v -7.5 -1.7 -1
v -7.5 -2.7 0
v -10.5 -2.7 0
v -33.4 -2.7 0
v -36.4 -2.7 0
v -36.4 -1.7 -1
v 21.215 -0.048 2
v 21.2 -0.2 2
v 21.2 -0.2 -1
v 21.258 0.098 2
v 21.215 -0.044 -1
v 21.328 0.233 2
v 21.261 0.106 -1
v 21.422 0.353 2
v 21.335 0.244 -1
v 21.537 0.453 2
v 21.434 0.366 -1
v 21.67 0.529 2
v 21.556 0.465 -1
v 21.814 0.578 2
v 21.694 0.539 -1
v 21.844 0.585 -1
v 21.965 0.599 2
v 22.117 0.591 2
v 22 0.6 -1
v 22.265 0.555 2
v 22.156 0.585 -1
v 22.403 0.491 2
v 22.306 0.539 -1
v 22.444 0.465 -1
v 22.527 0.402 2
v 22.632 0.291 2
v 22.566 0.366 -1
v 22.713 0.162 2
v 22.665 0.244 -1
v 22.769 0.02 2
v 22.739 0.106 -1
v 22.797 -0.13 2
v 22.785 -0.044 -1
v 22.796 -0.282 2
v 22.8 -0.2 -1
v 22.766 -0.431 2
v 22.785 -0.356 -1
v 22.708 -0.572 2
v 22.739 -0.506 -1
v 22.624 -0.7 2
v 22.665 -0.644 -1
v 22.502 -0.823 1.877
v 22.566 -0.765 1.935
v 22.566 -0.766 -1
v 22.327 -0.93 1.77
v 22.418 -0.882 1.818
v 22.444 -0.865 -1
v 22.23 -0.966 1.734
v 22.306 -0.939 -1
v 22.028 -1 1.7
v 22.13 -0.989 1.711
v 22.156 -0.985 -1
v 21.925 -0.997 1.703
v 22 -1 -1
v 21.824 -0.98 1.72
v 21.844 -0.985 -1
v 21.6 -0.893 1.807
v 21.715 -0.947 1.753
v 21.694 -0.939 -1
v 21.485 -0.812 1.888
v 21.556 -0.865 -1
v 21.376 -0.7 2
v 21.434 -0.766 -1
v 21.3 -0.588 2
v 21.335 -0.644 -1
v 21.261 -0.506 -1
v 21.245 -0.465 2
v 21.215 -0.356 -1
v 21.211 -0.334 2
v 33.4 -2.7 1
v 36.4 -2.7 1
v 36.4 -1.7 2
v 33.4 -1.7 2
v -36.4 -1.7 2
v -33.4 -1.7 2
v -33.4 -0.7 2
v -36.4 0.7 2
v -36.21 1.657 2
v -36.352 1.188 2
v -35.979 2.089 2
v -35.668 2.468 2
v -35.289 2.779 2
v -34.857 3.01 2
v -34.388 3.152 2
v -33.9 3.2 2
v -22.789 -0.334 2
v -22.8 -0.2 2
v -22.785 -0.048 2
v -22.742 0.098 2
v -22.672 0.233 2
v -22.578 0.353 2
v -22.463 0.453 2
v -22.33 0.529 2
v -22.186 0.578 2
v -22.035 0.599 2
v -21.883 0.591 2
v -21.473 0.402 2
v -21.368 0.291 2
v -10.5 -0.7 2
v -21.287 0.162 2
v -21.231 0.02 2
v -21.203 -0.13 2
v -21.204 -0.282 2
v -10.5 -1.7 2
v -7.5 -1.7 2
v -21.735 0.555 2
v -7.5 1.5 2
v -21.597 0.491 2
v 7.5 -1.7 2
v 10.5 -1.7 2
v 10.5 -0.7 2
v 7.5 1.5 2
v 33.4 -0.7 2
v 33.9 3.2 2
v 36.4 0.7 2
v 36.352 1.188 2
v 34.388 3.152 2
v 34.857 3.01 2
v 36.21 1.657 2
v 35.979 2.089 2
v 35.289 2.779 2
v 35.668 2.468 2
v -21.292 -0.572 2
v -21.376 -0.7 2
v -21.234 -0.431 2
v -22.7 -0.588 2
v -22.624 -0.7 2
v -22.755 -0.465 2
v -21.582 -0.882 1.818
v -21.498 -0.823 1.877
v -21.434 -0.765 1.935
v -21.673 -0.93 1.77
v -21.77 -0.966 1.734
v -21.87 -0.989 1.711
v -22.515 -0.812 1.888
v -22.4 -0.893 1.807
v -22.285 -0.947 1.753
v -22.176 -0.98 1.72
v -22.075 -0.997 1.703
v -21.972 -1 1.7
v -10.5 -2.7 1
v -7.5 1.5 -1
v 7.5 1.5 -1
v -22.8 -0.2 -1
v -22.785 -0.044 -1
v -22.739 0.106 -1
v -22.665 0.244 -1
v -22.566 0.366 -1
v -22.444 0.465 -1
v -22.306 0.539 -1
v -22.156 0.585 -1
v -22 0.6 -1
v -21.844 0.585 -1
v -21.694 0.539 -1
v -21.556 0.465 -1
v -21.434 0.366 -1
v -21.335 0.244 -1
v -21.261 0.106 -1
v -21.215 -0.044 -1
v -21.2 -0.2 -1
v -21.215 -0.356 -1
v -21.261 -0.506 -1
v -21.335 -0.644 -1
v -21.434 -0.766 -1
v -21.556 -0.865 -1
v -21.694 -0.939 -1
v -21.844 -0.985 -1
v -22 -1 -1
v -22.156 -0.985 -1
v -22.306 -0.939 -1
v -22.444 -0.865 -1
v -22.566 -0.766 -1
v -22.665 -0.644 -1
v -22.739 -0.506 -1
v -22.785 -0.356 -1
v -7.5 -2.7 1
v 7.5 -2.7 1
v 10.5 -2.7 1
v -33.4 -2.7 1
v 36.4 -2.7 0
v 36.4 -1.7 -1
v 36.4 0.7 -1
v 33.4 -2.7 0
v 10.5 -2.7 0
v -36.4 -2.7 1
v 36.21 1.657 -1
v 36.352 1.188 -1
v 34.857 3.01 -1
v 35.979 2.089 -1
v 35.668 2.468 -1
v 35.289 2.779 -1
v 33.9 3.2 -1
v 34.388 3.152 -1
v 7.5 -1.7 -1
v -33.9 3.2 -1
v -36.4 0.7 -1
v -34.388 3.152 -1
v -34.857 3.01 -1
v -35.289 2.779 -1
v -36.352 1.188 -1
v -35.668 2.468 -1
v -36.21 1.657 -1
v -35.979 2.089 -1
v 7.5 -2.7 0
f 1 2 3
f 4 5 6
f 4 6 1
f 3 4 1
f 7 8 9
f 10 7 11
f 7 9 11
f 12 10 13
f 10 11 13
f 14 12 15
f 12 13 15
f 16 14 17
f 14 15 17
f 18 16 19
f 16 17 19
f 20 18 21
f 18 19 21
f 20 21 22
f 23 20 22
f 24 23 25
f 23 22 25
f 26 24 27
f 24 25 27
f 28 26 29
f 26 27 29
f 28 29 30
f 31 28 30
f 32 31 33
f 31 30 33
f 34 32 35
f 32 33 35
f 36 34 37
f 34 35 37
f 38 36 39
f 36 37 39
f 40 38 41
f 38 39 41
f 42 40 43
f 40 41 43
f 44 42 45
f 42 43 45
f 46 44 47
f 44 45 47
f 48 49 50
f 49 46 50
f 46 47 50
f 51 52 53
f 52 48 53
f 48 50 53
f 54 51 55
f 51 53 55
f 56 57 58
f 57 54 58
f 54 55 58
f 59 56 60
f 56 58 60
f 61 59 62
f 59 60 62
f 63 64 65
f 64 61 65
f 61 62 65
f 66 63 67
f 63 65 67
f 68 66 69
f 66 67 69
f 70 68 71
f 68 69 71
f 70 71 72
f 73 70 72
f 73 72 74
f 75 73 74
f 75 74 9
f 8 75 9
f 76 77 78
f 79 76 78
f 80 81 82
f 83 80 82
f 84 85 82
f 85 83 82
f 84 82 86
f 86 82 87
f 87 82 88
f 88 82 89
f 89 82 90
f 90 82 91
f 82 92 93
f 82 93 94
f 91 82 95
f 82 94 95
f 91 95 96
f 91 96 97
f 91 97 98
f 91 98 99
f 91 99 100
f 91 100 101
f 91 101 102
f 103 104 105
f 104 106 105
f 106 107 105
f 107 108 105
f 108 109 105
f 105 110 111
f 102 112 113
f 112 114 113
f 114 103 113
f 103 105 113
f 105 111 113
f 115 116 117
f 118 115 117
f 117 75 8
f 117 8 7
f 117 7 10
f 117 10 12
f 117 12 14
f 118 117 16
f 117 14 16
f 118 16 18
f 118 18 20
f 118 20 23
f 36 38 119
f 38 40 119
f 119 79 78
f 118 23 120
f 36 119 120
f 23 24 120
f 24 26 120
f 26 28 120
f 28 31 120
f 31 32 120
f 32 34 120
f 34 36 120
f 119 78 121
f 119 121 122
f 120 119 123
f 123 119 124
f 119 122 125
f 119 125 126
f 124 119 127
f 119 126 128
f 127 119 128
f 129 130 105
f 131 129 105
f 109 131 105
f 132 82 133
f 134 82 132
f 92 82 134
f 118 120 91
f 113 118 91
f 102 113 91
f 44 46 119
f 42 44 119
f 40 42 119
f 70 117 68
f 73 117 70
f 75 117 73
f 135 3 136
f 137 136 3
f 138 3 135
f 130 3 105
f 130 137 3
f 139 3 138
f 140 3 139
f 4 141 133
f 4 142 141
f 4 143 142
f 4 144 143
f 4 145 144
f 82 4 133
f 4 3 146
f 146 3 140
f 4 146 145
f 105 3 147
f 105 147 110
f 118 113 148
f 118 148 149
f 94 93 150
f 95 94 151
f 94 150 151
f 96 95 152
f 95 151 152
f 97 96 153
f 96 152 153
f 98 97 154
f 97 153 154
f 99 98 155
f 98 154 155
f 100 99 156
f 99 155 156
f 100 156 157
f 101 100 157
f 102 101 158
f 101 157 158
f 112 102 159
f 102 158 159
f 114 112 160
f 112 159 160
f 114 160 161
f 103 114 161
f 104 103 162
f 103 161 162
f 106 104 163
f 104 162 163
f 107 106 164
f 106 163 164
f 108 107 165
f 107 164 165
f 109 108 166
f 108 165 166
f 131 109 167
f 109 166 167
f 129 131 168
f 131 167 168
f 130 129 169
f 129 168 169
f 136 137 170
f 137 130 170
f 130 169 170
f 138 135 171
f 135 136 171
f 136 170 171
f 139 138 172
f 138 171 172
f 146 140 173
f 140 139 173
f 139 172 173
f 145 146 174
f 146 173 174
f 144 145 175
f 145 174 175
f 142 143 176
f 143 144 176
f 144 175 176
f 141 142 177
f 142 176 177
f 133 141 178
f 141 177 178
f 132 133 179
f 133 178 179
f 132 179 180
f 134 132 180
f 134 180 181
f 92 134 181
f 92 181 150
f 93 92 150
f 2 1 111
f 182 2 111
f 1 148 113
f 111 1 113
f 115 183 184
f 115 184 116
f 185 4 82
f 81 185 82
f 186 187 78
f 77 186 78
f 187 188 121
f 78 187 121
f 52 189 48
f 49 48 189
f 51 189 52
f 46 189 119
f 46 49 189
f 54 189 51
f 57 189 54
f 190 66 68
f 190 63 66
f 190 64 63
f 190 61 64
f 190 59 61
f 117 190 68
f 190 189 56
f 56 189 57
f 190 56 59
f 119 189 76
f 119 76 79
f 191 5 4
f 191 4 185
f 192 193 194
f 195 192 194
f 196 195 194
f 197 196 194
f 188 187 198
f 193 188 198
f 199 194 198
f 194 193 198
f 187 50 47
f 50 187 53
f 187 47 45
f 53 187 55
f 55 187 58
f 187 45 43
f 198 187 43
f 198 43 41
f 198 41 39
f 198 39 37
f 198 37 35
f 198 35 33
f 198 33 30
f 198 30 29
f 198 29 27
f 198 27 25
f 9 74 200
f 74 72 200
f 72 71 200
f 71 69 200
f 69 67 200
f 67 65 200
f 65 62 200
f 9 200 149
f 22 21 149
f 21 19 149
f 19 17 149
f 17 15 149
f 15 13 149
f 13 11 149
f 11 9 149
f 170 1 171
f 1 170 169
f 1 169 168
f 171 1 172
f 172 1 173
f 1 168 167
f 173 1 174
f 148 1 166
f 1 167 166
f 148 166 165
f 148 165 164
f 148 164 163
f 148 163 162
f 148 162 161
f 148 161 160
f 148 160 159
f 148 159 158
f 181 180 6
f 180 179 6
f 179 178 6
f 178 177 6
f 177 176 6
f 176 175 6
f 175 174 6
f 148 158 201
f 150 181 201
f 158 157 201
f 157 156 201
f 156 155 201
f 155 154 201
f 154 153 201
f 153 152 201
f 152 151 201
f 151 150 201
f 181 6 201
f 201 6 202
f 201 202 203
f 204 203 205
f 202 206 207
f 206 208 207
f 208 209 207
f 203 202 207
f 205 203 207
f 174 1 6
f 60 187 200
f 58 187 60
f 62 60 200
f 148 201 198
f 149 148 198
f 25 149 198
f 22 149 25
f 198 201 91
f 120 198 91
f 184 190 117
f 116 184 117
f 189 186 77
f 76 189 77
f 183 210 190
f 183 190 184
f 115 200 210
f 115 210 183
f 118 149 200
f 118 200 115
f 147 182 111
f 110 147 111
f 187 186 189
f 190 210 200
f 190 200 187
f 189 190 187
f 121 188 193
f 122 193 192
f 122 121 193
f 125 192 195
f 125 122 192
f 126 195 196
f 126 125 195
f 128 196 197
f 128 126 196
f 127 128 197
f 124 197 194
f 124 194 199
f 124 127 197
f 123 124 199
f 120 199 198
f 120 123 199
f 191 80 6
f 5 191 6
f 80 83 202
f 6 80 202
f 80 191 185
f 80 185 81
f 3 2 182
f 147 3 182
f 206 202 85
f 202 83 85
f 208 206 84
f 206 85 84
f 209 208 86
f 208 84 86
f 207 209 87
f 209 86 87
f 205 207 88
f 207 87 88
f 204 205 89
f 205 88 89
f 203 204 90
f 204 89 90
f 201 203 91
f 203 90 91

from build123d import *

# Parameters (mm, degrees)
BOSS_EXTRUDE1_DEPTH       = 36.4
FILLET3_R                 = 2.5
CUT_EXTRUDE5_DEPTH        = 72.8
BOSS_EXTRUDE2_DEPTH       = 72.8
M2X0_4_TAPPED_HOLE1_D     = 1.6
M2X0_4_TAPPED_HOLE1_DEPTH = 3.6
M2X0_4_TAPPED_HOLE1_TIP   = 0.480688495
FILLET4_R                 = 2.5
SKETCH4_W                 = 15
SKETCH4_H                 = 4.7
CUT_EXTRUDE4_DEPTH        = 5
BOSS_EXTRUDE6_DEPTH       = 3
BOSS_EXTRUDE7_DEPTH       = 3


with BuildPart() as part:
    # Sketch1 → Boss-Extrude1 (new body, symmetric)
    with BuildSketch(Plane(origin=(0, 0, 0), x_dir=(0, 0, -1), z_dir=(1, 0, 0))):
        Polygon((0, -3.2), (-2, -1.2), (-2, 3.2), (0, 3.2), align=None)
    extrude(amount=BOSS_EXTRUDE1_DEPTH, both=True)

    # Fillet3
    fillet3_edges = [part.edges().sort_by_distance(p)[0] for p in [
        (-36.4, 3.2, 1),
        (36.4, 3.2, 1),
    ]]
    fillet(fillet3_edges, radius=FILLET3_R)

    # Sketch5 → Cut-Extrude5 (cut)
    with BuildSketch(Plane.ZY.offset(36.4)):
        Polygon((0, -2.7), (2, -0.7), (2, -1.2), (0, -3.2), align=None)
    extrude(amount=-CUT_EXTRUDE5_DEPTH, mode=Mode.SUBTRACT)

    # Sketch7 → Boss-Extrude2 (add)
    with BuildSketch(Plane.ZY.offset(36.4)):
        Polygon((0, -2.7), (-1, -1.7), (-1, 3.2), (0, 3.2), align=None)
    extrude(amount=-BOSS_EXTRUDE2_DEPTH)

    # M2x0.4 Tapped Hole1
    with Locations(Plane.XY.offset(2)):
        with Locations((-22, -0.2), (22, -0.2), (0, -0.2)):
            Hole(M2X0_4_TAPPED_HOLE1_D / 2, depth=M2X0_4_TAPPED_HOLE1_DEPTH)
            with Locations((0, 0, -(M2X0_4_TAPPED_HOLE1_DEPTH + M2X0_4_TAPPED_HOLE1_TIP / 2))):  # 118° drill point
                Cone(0, M2X0_4_TAPPED_HOLE1_D / 2, M2X0_4_TAPPED_HOLE1_TIP, mode=Mode.SUBTRACT)

    # Fillet4
    fillet4_edges = [part.edges().sort_by_distance(p)[0] for p in [
        (36.4, 3.2, -0.5),
        (-36.4, 3.2, -0.5),
    ]]
    fillet(fillet4_edges, radius=FILLET4_R)

    # Sketch4 → Cut-Extrude4 (cut, symmetric)
    with BuildSketch(Plane.XY):
        with Locations((0, -0.85)):
            Rectangle(SKETCH4_W, SKETCH4_H)
    extrude(amount=CUT_EXTRUDE4_DEPTH, both=True, mode=Mode.SUBTRACT)

    # Sketch11 → Boss-Extrude6 (add)
    with BuildSketch(Plane(origin=(36.4, 0, 0), x_dir=(0, 0, -1), z_dir=(1, 0, 0))):
        Polygon((0, -2.7), (-1, -2.7), (-2, -1.7), (-2, -0.7), align=None)
    extrude(amount=-BOSS_EXTRUDE6_DEPTH)

    # Sketch12 → Boss-Extrude7 (add)
    with BuildSketch(Plane.ZY.offset(-7.5)):
        Polygon((0, -2.7), (1, -2.7), (2, -1.7), (2, -0.7), align=None)
    extrude(amount=-BOSS_EXTRUDE7_DEPTH)

    # Mirror7: part across plane


with BuildPart() as part_1:
    add(part.part)
    add(part.part.mirror(Plane(origin=(0, 0, 0), x_dir=(0, 0, 1), z_dir=(1, 0, 0))))


solid = part_1.part
